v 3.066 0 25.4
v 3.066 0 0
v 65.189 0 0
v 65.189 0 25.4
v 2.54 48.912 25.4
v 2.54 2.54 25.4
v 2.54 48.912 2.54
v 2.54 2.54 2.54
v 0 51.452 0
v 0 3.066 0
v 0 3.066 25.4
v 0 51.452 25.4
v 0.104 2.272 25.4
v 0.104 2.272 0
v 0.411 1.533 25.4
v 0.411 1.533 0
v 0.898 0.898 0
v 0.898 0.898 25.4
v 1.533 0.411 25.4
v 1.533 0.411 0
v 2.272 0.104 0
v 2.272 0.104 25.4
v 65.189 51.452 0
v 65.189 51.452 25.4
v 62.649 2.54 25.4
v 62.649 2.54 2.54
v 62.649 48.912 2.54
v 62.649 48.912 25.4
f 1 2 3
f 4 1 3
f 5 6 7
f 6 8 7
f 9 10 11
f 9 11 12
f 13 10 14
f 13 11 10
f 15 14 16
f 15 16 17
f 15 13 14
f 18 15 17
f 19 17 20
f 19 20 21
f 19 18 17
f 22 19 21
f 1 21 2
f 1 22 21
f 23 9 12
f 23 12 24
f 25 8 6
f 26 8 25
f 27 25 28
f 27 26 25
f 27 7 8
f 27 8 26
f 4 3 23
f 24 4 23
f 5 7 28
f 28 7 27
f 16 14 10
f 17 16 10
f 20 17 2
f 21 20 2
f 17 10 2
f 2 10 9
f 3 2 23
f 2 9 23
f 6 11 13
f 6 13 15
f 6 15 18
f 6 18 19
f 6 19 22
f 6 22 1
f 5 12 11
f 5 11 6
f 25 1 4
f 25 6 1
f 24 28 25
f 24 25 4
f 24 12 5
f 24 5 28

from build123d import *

# Parameters (mm, degrees)
F0_W     = 65.18887
F0_H     = 51.452216
F1_DEPTH = 25.4
F2_T     = -25.4
F3_T     = -2.54
F4_R     = 3.066051


with BuildPart() as f1:
    # F0 (on Top) → F1 (new body)
    with BuildSketch(Plane.XY):
        with Locations((32.594435, 25.726108)):
            Rectangle(F0_W, F0_H)
    extrude(amount=F1_DEPTH)

    # F2
    f2_openings = [f1.faces().sort_by_distance(p)[0] for p in [
        (32.594435, 25.726108, 25.4),
    ]]
    offset(amount=F2_T, openings=f2_openings)

    # F3
    f3_openings = [f1.faces().sort_by_distance(p)[0] for p in [
        (32.594435, 25.726108, 25.4),
    ]]
    offset(amount=F3_T, openings=f3_openings)

    # F4
    f4_edges = [f1.edges().sort_by_distance(p)[0] for p in [
        (0, 0, 12.7),
    ]]
    fillet(f4_edges, radius=F4_R)


solid = f1.part
